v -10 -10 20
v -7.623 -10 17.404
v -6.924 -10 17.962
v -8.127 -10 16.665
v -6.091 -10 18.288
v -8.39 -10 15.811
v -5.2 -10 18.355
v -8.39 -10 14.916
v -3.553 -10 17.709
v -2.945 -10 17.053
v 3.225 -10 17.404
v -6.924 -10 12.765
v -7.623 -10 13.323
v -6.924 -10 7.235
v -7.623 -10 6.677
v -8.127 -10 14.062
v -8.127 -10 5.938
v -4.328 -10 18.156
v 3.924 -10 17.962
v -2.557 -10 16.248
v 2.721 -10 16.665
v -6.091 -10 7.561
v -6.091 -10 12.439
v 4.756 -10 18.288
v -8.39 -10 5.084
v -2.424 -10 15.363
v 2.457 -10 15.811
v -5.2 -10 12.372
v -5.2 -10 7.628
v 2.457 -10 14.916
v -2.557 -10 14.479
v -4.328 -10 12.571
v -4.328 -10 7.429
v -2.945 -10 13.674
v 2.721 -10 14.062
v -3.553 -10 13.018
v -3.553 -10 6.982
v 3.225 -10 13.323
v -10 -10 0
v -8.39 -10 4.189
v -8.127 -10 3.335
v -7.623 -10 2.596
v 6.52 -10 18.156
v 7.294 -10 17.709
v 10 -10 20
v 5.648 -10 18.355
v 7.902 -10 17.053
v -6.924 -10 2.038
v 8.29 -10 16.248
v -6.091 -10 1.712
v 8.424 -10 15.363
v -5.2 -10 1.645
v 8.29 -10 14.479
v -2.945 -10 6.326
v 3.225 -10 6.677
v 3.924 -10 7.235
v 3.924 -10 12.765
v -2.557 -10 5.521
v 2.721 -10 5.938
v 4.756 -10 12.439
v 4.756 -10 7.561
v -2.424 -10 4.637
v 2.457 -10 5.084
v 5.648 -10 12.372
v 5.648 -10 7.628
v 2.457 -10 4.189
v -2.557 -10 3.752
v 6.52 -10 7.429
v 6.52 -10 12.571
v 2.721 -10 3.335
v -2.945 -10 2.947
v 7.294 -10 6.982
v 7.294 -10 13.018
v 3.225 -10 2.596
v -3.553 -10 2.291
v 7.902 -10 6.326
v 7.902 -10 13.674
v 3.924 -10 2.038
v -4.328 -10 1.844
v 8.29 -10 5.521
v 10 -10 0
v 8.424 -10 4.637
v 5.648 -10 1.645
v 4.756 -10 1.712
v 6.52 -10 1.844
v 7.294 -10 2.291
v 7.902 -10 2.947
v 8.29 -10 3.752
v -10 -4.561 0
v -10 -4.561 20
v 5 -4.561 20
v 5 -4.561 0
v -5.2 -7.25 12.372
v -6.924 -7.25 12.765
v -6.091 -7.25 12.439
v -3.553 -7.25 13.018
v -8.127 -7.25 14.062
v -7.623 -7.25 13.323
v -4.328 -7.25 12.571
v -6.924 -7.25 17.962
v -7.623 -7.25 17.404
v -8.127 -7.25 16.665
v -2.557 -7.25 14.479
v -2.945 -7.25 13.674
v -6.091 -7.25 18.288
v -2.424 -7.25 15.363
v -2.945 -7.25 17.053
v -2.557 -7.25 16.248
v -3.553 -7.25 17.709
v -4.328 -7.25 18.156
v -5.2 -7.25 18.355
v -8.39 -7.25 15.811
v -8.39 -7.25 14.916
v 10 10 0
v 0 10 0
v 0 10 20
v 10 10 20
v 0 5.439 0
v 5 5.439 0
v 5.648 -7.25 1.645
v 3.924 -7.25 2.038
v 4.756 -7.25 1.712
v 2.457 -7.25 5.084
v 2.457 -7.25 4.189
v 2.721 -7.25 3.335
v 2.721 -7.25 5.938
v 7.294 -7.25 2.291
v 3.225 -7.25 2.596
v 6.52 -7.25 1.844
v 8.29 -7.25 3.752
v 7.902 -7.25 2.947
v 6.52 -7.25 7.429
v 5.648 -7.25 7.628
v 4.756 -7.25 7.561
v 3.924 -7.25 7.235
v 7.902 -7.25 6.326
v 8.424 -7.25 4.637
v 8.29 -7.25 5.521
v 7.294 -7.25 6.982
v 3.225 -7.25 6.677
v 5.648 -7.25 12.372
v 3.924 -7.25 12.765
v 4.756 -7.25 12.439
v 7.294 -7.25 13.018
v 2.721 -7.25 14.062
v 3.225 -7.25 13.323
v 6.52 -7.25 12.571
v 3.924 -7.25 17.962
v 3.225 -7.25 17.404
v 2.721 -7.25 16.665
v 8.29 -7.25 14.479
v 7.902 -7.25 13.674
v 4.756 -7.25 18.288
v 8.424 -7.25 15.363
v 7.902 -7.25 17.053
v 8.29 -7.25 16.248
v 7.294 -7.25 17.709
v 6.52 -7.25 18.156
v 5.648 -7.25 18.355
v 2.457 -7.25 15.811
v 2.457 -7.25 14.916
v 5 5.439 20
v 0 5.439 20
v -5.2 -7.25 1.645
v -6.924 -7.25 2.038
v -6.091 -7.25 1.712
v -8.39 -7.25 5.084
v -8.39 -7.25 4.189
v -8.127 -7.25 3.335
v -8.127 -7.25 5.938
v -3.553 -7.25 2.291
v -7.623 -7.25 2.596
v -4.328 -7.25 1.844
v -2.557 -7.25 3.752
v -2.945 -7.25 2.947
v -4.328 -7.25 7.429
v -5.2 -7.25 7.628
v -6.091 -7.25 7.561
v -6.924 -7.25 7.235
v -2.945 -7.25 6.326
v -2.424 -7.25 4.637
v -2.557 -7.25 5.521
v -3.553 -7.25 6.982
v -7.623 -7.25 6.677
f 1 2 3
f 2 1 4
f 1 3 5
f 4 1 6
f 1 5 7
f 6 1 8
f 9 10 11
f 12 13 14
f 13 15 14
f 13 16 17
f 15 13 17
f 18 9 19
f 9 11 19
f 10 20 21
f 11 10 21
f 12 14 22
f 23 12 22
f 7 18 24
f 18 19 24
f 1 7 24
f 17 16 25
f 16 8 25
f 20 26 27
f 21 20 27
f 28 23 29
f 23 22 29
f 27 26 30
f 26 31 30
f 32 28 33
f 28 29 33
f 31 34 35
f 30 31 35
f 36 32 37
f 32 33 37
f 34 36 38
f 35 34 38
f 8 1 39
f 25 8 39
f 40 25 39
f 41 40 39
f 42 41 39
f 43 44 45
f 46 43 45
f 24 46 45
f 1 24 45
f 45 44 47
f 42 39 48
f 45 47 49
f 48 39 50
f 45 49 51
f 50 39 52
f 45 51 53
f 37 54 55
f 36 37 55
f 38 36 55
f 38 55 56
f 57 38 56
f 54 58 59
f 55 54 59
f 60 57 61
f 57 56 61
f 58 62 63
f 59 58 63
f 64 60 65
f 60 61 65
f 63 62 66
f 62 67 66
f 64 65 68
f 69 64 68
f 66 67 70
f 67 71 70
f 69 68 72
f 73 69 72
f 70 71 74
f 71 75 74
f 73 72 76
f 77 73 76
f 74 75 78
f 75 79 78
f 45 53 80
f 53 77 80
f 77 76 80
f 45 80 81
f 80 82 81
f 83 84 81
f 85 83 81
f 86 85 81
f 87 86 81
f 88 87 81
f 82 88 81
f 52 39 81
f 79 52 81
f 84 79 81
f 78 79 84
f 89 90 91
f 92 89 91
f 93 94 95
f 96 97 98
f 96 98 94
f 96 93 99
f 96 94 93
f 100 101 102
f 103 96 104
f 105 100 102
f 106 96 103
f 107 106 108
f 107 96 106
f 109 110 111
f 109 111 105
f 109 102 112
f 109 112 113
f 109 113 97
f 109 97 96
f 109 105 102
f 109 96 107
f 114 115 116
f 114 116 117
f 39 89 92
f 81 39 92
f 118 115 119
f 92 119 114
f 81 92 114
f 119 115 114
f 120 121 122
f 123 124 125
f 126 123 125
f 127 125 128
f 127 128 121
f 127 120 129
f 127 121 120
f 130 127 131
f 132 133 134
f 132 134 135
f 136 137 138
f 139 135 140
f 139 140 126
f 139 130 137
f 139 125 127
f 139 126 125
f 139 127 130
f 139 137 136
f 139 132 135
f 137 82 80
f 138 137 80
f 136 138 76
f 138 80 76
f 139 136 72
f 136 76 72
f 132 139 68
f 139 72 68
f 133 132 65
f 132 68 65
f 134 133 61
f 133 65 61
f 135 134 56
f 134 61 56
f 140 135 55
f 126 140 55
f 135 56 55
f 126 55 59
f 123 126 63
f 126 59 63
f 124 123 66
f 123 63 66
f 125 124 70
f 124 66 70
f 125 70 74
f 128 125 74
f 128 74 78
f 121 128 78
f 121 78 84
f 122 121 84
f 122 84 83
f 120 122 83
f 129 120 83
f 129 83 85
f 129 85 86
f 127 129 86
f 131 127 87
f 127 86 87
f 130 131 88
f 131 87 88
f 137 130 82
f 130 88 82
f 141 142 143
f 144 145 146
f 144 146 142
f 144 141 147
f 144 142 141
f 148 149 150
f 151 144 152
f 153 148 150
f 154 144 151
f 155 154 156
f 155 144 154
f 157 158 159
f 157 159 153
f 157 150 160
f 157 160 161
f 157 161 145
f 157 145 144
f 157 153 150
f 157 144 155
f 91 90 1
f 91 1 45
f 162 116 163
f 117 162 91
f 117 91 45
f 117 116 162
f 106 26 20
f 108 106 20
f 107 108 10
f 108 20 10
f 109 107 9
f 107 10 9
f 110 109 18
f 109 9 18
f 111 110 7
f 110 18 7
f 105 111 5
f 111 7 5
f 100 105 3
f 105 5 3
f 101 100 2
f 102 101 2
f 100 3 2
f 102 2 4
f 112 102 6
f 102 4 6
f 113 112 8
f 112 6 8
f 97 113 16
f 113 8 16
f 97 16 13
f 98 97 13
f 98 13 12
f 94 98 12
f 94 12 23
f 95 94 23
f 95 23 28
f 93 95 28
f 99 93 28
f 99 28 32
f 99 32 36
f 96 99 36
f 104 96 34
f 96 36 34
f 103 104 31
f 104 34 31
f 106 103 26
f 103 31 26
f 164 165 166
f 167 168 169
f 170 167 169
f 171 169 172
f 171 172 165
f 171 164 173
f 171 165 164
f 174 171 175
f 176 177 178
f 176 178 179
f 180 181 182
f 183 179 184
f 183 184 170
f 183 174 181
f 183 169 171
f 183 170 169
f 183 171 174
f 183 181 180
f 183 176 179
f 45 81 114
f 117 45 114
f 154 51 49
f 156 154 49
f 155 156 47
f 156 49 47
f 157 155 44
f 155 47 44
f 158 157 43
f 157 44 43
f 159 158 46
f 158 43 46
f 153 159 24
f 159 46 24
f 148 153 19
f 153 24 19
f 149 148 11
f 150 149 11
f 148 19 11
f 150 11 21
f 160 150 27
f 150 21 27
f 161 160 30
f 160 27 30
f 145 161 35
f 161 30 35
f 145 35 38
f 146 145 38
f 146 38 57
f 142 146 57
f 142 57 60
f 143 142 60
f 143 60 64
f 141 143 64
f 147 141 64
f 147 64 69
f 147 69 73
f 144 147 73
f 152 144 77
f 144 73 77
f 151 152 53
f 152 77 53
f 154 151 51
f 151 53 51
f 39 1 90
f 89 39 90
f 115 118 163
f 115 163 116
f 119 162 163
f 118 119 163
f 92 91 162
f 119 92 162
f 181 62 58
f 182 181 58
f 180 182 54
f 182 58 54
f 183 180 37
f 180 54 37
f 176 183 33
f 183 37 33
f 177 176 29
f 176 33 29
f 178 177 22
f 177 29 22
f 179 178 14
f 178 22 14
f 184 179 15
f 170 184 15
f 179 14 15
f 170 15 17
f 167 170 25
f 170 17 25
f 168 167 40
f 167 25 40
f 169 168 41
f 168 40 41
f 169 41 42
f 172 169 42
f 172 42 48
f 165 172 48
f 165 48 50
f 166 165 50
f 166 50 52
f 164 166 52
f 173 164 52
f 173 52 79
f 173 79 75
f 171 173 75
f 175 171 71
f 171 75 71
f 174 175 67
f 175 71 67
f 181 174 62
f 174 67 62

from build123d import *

# Parameters (mm, degrees)
F0_W     = 20
F0_H     = 20
F1_DEPTH = 20
F2_W     = 10
F2_H     = 4.5614074916
F3_DEPTH = 20
F4_R     = 3
F5_DEPTH = 2.75


with BuildPart() as f1:
    # F0 (on Top) → F1 (new body)
    with BuildSketch(Plane.XY):
        Rectangle(F0_W, F0_H)
    extrude(amount=F1_DEPTH)

    # F2 (on face) → F3 (cut)
    with BuildSketch(Plane.XY.offset(20)):
        Polygon((-10, -4.5614074916), (5, -4.5614074916), (5, 5.4385925084), (0, 5.4385925084), (-10, 5.4385925084), align=None)
        with Locations((-5, 7.7192962542)):
            Rectangle(F2_W, F2_H)
    extrude(amount=-F3_DEPTH, mode=Mode.SUBTRACT)

    # F4 (on face) → F5 (cut)
    with BuildSketch(Plane.XZ.offset(10)):
        with Locations((-5.4237376899, 4.6365144663)):
            Circle(F4_R)
        with Locations((-5.4237376899, 15.3634855337)):
            Circle(F4_R)
        with Locations((5.4237376899, 15.3634855337)):
            Circle(F4_R)
        with Locations((5.4237376899, 4.6365144663)):
            Circle(F4_R)
    extrude(amount=-F5_DEPTH, mode=Mode.SUBTRACT)


solid = f1.part
